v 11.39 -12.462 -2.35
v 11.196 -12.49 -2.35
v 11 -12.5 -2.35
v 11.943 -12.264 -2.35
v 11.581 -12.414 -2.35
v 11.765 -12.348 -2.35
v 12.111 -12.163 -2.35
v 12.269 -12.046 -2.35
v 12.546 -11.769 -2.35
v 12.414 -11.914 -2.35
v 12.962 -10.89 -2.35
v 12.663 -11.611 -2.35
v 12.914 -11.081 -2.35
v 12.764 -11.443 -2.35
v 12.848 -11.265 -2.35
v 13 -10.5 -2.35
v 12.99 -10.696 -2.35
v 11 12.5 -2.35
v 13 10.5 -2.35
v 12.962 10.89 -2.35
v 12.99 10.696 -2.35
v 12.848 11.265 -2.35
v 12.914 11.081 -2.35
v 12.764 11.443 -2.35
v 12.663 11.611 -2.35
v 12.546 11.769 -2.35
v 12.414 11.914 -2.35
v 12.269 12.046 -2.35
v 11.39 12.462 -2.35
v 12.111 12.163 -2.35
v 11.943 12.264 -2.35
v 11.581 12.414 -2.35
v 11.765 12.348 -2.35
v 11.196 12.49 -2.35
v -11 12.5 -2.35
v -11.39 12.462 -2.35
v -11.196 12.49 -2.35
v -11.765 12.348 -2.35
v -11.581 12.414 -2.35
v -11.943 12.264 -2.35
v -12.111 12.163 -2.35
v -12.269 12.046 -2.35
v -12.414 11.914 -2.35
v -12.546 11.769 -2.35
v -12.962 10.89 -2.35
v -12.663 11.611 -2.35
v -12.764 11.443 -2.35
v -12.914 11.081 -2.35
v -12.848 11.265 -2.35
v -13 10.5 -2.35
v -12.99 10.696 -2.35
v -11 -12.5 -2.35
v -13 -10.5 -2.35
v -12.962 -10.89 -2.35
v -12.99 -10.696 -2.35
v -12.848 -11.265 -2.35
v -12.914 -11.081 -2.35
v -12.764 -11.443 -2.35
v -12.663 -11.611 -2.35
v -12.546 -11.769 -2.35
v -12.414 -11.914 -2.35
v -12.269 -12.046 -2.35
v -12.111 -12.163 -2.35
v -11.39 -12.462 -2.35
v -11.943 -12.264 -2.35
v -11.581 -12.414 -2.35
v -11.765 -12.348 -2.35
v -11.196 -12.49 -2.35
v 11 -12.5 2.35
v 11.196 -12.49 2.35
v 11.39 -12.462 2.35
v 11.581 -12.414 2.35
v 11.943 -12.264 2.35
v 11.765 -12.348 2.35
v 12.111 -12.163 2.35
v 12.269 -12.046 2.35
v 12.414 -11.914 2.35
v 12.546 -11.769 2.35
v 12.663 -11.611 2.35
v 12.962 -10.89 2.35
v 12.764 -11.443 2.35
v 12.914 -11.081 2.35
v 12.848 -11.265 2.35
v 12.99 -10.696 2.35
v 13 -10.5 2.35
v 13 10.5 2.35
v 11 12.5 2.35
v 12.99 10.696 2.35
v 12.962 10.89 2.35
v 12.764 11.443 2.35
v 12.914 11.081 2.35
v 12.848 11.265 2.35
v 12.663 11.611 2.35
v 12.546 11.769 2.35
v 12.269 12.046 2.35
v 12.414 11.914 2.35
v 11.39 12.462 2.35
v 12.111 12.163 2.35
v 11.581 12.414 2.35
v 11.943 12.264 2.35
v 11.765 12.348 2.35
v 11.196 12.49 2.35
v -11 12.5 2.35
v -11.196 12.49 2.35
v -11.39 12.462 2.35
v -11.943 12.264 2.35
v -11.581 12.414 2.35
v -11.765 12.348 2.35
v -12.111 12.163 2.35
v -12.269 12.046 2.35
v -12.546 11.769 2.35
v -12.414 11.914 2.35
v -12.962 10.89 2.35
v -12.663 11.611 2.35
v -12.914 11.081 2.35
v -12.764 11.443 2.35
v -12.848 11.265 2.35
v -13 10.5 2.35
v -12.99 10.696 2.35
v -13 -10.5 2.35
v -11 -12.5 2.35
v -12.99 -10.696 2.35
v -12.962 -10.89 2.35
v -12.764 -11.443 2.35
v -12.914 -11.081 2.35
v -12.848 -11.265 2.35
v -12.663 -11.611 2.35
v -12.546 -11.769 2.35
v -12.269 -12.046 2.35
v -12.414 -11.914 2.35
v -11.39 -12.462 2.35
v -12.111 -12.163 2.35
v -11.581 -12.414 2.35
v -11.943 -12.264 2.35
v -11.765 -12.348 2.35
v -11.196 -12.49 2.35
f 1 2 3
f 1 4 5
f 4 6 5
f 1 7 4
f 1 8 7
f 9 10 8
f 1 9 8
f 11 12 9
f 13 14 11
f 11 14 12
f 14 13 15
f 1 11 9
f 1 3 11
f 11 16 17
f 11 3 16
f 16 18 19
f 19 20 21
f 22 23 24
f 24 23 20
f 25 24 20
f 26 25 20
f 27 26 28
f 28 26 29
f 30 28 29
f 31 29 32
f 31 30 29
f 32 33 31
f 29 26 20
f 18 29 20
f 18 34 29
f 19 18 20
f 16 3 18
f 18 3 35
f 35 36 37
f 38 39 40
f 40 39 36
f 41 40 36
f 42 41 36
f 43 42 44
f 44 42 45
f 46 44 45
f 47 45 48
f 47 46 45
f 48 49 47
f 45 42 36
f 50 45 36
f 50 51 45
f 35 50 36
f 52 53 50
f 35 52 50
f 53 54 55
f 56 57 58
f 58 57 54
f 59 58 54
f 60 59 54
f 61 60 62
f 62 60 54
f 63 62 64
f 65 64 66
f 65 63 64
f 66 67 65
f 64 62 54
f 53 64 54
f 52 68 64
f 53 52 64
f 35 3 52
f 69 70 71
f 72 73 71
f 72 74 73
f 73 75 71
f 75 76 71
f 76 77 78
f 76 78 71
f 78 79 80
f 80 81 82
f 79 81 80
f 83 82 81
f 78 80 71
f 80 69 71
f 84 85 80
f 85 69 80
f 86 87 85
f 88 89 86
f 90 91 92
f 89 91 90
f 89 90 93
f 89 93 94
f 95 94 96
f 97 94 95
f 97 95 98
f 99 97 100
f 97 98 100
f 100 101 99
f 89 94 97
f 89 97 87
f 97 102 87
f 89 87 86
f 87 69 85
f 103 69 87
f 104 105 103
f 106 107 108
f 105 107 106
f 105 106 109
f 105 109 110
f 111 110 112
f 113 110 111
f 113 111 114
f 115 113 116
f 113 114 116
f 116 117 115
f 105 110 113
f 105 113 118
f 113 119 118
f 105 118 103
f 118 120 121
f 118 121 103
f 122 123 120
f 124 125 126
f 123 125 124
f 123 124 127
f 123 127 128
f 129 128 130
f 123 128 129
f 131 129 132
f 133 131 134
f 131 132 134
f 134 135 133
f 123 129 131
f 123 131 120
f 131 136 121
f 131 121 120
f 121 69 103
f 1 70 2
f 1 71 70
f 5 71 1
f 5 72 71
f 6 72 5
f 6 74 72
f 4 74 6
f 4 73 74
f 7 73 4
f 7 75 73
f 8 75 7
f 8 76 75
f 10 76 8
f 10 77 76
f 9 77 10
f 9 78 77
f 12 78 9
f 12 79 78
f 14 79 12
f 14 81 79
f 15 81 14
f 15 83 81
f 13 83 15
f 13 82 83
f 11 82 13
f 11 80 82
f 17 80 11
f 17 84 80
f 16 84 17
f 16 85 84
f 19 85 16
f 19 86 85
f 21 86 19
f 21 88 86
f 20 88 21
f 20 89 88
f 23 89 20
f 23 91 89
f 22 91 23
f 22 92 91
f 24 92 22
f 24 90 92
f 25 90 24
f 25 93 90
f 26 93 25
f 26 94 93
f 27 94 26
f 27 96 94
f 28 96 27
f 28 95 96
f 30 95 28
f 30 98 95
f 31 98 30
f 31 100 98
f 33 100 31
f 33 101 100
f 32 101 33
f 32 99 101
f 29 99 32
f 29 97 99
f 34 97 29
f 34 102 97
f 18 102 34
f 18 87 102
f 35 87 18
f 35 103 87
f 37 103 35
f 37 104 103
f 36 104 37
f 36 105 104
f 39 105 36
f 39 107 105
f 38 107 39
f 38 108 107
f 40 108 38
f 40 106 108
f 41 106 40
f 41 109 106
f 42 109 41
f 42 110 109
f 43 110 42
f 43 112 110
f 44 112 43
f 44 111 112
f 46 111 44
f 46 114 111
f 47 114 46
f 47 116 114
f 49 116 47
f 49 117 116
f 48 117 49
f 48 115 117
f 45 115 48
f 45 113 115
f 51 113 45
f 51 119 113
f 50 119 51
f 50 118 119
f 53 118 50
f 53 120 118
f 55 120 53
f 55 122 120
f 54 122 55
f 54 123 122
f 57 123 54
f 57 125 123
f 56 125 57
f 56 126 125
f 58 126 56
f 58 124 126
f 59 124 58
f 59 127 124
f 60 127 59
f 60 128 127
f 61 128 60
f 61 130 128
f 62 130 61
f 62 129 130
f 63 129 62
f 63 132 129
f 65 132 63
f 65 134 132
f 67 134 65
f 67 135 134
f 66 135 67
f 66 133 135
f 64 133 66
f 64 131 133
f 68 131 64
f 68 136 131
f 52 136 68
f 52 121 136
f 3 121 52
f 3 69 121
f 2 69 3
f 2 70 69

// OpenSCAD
$fn=64;

bracket_size = [26, 25, 4.7];

module extrusion_bracket(size=[26,25,4.7], corner_r=2.0) {
    x = size[0];
    y = size[1];
    z = size[2];
    r = min(corner_r, min(x,y)/2);

    linear_extrude(height=z, center=true)
        offset(r=r)
            offset(delta=-r)
                square([x, y], center=true);
}

extrusion_bracket(bracket_size, corner_r=2.0);
